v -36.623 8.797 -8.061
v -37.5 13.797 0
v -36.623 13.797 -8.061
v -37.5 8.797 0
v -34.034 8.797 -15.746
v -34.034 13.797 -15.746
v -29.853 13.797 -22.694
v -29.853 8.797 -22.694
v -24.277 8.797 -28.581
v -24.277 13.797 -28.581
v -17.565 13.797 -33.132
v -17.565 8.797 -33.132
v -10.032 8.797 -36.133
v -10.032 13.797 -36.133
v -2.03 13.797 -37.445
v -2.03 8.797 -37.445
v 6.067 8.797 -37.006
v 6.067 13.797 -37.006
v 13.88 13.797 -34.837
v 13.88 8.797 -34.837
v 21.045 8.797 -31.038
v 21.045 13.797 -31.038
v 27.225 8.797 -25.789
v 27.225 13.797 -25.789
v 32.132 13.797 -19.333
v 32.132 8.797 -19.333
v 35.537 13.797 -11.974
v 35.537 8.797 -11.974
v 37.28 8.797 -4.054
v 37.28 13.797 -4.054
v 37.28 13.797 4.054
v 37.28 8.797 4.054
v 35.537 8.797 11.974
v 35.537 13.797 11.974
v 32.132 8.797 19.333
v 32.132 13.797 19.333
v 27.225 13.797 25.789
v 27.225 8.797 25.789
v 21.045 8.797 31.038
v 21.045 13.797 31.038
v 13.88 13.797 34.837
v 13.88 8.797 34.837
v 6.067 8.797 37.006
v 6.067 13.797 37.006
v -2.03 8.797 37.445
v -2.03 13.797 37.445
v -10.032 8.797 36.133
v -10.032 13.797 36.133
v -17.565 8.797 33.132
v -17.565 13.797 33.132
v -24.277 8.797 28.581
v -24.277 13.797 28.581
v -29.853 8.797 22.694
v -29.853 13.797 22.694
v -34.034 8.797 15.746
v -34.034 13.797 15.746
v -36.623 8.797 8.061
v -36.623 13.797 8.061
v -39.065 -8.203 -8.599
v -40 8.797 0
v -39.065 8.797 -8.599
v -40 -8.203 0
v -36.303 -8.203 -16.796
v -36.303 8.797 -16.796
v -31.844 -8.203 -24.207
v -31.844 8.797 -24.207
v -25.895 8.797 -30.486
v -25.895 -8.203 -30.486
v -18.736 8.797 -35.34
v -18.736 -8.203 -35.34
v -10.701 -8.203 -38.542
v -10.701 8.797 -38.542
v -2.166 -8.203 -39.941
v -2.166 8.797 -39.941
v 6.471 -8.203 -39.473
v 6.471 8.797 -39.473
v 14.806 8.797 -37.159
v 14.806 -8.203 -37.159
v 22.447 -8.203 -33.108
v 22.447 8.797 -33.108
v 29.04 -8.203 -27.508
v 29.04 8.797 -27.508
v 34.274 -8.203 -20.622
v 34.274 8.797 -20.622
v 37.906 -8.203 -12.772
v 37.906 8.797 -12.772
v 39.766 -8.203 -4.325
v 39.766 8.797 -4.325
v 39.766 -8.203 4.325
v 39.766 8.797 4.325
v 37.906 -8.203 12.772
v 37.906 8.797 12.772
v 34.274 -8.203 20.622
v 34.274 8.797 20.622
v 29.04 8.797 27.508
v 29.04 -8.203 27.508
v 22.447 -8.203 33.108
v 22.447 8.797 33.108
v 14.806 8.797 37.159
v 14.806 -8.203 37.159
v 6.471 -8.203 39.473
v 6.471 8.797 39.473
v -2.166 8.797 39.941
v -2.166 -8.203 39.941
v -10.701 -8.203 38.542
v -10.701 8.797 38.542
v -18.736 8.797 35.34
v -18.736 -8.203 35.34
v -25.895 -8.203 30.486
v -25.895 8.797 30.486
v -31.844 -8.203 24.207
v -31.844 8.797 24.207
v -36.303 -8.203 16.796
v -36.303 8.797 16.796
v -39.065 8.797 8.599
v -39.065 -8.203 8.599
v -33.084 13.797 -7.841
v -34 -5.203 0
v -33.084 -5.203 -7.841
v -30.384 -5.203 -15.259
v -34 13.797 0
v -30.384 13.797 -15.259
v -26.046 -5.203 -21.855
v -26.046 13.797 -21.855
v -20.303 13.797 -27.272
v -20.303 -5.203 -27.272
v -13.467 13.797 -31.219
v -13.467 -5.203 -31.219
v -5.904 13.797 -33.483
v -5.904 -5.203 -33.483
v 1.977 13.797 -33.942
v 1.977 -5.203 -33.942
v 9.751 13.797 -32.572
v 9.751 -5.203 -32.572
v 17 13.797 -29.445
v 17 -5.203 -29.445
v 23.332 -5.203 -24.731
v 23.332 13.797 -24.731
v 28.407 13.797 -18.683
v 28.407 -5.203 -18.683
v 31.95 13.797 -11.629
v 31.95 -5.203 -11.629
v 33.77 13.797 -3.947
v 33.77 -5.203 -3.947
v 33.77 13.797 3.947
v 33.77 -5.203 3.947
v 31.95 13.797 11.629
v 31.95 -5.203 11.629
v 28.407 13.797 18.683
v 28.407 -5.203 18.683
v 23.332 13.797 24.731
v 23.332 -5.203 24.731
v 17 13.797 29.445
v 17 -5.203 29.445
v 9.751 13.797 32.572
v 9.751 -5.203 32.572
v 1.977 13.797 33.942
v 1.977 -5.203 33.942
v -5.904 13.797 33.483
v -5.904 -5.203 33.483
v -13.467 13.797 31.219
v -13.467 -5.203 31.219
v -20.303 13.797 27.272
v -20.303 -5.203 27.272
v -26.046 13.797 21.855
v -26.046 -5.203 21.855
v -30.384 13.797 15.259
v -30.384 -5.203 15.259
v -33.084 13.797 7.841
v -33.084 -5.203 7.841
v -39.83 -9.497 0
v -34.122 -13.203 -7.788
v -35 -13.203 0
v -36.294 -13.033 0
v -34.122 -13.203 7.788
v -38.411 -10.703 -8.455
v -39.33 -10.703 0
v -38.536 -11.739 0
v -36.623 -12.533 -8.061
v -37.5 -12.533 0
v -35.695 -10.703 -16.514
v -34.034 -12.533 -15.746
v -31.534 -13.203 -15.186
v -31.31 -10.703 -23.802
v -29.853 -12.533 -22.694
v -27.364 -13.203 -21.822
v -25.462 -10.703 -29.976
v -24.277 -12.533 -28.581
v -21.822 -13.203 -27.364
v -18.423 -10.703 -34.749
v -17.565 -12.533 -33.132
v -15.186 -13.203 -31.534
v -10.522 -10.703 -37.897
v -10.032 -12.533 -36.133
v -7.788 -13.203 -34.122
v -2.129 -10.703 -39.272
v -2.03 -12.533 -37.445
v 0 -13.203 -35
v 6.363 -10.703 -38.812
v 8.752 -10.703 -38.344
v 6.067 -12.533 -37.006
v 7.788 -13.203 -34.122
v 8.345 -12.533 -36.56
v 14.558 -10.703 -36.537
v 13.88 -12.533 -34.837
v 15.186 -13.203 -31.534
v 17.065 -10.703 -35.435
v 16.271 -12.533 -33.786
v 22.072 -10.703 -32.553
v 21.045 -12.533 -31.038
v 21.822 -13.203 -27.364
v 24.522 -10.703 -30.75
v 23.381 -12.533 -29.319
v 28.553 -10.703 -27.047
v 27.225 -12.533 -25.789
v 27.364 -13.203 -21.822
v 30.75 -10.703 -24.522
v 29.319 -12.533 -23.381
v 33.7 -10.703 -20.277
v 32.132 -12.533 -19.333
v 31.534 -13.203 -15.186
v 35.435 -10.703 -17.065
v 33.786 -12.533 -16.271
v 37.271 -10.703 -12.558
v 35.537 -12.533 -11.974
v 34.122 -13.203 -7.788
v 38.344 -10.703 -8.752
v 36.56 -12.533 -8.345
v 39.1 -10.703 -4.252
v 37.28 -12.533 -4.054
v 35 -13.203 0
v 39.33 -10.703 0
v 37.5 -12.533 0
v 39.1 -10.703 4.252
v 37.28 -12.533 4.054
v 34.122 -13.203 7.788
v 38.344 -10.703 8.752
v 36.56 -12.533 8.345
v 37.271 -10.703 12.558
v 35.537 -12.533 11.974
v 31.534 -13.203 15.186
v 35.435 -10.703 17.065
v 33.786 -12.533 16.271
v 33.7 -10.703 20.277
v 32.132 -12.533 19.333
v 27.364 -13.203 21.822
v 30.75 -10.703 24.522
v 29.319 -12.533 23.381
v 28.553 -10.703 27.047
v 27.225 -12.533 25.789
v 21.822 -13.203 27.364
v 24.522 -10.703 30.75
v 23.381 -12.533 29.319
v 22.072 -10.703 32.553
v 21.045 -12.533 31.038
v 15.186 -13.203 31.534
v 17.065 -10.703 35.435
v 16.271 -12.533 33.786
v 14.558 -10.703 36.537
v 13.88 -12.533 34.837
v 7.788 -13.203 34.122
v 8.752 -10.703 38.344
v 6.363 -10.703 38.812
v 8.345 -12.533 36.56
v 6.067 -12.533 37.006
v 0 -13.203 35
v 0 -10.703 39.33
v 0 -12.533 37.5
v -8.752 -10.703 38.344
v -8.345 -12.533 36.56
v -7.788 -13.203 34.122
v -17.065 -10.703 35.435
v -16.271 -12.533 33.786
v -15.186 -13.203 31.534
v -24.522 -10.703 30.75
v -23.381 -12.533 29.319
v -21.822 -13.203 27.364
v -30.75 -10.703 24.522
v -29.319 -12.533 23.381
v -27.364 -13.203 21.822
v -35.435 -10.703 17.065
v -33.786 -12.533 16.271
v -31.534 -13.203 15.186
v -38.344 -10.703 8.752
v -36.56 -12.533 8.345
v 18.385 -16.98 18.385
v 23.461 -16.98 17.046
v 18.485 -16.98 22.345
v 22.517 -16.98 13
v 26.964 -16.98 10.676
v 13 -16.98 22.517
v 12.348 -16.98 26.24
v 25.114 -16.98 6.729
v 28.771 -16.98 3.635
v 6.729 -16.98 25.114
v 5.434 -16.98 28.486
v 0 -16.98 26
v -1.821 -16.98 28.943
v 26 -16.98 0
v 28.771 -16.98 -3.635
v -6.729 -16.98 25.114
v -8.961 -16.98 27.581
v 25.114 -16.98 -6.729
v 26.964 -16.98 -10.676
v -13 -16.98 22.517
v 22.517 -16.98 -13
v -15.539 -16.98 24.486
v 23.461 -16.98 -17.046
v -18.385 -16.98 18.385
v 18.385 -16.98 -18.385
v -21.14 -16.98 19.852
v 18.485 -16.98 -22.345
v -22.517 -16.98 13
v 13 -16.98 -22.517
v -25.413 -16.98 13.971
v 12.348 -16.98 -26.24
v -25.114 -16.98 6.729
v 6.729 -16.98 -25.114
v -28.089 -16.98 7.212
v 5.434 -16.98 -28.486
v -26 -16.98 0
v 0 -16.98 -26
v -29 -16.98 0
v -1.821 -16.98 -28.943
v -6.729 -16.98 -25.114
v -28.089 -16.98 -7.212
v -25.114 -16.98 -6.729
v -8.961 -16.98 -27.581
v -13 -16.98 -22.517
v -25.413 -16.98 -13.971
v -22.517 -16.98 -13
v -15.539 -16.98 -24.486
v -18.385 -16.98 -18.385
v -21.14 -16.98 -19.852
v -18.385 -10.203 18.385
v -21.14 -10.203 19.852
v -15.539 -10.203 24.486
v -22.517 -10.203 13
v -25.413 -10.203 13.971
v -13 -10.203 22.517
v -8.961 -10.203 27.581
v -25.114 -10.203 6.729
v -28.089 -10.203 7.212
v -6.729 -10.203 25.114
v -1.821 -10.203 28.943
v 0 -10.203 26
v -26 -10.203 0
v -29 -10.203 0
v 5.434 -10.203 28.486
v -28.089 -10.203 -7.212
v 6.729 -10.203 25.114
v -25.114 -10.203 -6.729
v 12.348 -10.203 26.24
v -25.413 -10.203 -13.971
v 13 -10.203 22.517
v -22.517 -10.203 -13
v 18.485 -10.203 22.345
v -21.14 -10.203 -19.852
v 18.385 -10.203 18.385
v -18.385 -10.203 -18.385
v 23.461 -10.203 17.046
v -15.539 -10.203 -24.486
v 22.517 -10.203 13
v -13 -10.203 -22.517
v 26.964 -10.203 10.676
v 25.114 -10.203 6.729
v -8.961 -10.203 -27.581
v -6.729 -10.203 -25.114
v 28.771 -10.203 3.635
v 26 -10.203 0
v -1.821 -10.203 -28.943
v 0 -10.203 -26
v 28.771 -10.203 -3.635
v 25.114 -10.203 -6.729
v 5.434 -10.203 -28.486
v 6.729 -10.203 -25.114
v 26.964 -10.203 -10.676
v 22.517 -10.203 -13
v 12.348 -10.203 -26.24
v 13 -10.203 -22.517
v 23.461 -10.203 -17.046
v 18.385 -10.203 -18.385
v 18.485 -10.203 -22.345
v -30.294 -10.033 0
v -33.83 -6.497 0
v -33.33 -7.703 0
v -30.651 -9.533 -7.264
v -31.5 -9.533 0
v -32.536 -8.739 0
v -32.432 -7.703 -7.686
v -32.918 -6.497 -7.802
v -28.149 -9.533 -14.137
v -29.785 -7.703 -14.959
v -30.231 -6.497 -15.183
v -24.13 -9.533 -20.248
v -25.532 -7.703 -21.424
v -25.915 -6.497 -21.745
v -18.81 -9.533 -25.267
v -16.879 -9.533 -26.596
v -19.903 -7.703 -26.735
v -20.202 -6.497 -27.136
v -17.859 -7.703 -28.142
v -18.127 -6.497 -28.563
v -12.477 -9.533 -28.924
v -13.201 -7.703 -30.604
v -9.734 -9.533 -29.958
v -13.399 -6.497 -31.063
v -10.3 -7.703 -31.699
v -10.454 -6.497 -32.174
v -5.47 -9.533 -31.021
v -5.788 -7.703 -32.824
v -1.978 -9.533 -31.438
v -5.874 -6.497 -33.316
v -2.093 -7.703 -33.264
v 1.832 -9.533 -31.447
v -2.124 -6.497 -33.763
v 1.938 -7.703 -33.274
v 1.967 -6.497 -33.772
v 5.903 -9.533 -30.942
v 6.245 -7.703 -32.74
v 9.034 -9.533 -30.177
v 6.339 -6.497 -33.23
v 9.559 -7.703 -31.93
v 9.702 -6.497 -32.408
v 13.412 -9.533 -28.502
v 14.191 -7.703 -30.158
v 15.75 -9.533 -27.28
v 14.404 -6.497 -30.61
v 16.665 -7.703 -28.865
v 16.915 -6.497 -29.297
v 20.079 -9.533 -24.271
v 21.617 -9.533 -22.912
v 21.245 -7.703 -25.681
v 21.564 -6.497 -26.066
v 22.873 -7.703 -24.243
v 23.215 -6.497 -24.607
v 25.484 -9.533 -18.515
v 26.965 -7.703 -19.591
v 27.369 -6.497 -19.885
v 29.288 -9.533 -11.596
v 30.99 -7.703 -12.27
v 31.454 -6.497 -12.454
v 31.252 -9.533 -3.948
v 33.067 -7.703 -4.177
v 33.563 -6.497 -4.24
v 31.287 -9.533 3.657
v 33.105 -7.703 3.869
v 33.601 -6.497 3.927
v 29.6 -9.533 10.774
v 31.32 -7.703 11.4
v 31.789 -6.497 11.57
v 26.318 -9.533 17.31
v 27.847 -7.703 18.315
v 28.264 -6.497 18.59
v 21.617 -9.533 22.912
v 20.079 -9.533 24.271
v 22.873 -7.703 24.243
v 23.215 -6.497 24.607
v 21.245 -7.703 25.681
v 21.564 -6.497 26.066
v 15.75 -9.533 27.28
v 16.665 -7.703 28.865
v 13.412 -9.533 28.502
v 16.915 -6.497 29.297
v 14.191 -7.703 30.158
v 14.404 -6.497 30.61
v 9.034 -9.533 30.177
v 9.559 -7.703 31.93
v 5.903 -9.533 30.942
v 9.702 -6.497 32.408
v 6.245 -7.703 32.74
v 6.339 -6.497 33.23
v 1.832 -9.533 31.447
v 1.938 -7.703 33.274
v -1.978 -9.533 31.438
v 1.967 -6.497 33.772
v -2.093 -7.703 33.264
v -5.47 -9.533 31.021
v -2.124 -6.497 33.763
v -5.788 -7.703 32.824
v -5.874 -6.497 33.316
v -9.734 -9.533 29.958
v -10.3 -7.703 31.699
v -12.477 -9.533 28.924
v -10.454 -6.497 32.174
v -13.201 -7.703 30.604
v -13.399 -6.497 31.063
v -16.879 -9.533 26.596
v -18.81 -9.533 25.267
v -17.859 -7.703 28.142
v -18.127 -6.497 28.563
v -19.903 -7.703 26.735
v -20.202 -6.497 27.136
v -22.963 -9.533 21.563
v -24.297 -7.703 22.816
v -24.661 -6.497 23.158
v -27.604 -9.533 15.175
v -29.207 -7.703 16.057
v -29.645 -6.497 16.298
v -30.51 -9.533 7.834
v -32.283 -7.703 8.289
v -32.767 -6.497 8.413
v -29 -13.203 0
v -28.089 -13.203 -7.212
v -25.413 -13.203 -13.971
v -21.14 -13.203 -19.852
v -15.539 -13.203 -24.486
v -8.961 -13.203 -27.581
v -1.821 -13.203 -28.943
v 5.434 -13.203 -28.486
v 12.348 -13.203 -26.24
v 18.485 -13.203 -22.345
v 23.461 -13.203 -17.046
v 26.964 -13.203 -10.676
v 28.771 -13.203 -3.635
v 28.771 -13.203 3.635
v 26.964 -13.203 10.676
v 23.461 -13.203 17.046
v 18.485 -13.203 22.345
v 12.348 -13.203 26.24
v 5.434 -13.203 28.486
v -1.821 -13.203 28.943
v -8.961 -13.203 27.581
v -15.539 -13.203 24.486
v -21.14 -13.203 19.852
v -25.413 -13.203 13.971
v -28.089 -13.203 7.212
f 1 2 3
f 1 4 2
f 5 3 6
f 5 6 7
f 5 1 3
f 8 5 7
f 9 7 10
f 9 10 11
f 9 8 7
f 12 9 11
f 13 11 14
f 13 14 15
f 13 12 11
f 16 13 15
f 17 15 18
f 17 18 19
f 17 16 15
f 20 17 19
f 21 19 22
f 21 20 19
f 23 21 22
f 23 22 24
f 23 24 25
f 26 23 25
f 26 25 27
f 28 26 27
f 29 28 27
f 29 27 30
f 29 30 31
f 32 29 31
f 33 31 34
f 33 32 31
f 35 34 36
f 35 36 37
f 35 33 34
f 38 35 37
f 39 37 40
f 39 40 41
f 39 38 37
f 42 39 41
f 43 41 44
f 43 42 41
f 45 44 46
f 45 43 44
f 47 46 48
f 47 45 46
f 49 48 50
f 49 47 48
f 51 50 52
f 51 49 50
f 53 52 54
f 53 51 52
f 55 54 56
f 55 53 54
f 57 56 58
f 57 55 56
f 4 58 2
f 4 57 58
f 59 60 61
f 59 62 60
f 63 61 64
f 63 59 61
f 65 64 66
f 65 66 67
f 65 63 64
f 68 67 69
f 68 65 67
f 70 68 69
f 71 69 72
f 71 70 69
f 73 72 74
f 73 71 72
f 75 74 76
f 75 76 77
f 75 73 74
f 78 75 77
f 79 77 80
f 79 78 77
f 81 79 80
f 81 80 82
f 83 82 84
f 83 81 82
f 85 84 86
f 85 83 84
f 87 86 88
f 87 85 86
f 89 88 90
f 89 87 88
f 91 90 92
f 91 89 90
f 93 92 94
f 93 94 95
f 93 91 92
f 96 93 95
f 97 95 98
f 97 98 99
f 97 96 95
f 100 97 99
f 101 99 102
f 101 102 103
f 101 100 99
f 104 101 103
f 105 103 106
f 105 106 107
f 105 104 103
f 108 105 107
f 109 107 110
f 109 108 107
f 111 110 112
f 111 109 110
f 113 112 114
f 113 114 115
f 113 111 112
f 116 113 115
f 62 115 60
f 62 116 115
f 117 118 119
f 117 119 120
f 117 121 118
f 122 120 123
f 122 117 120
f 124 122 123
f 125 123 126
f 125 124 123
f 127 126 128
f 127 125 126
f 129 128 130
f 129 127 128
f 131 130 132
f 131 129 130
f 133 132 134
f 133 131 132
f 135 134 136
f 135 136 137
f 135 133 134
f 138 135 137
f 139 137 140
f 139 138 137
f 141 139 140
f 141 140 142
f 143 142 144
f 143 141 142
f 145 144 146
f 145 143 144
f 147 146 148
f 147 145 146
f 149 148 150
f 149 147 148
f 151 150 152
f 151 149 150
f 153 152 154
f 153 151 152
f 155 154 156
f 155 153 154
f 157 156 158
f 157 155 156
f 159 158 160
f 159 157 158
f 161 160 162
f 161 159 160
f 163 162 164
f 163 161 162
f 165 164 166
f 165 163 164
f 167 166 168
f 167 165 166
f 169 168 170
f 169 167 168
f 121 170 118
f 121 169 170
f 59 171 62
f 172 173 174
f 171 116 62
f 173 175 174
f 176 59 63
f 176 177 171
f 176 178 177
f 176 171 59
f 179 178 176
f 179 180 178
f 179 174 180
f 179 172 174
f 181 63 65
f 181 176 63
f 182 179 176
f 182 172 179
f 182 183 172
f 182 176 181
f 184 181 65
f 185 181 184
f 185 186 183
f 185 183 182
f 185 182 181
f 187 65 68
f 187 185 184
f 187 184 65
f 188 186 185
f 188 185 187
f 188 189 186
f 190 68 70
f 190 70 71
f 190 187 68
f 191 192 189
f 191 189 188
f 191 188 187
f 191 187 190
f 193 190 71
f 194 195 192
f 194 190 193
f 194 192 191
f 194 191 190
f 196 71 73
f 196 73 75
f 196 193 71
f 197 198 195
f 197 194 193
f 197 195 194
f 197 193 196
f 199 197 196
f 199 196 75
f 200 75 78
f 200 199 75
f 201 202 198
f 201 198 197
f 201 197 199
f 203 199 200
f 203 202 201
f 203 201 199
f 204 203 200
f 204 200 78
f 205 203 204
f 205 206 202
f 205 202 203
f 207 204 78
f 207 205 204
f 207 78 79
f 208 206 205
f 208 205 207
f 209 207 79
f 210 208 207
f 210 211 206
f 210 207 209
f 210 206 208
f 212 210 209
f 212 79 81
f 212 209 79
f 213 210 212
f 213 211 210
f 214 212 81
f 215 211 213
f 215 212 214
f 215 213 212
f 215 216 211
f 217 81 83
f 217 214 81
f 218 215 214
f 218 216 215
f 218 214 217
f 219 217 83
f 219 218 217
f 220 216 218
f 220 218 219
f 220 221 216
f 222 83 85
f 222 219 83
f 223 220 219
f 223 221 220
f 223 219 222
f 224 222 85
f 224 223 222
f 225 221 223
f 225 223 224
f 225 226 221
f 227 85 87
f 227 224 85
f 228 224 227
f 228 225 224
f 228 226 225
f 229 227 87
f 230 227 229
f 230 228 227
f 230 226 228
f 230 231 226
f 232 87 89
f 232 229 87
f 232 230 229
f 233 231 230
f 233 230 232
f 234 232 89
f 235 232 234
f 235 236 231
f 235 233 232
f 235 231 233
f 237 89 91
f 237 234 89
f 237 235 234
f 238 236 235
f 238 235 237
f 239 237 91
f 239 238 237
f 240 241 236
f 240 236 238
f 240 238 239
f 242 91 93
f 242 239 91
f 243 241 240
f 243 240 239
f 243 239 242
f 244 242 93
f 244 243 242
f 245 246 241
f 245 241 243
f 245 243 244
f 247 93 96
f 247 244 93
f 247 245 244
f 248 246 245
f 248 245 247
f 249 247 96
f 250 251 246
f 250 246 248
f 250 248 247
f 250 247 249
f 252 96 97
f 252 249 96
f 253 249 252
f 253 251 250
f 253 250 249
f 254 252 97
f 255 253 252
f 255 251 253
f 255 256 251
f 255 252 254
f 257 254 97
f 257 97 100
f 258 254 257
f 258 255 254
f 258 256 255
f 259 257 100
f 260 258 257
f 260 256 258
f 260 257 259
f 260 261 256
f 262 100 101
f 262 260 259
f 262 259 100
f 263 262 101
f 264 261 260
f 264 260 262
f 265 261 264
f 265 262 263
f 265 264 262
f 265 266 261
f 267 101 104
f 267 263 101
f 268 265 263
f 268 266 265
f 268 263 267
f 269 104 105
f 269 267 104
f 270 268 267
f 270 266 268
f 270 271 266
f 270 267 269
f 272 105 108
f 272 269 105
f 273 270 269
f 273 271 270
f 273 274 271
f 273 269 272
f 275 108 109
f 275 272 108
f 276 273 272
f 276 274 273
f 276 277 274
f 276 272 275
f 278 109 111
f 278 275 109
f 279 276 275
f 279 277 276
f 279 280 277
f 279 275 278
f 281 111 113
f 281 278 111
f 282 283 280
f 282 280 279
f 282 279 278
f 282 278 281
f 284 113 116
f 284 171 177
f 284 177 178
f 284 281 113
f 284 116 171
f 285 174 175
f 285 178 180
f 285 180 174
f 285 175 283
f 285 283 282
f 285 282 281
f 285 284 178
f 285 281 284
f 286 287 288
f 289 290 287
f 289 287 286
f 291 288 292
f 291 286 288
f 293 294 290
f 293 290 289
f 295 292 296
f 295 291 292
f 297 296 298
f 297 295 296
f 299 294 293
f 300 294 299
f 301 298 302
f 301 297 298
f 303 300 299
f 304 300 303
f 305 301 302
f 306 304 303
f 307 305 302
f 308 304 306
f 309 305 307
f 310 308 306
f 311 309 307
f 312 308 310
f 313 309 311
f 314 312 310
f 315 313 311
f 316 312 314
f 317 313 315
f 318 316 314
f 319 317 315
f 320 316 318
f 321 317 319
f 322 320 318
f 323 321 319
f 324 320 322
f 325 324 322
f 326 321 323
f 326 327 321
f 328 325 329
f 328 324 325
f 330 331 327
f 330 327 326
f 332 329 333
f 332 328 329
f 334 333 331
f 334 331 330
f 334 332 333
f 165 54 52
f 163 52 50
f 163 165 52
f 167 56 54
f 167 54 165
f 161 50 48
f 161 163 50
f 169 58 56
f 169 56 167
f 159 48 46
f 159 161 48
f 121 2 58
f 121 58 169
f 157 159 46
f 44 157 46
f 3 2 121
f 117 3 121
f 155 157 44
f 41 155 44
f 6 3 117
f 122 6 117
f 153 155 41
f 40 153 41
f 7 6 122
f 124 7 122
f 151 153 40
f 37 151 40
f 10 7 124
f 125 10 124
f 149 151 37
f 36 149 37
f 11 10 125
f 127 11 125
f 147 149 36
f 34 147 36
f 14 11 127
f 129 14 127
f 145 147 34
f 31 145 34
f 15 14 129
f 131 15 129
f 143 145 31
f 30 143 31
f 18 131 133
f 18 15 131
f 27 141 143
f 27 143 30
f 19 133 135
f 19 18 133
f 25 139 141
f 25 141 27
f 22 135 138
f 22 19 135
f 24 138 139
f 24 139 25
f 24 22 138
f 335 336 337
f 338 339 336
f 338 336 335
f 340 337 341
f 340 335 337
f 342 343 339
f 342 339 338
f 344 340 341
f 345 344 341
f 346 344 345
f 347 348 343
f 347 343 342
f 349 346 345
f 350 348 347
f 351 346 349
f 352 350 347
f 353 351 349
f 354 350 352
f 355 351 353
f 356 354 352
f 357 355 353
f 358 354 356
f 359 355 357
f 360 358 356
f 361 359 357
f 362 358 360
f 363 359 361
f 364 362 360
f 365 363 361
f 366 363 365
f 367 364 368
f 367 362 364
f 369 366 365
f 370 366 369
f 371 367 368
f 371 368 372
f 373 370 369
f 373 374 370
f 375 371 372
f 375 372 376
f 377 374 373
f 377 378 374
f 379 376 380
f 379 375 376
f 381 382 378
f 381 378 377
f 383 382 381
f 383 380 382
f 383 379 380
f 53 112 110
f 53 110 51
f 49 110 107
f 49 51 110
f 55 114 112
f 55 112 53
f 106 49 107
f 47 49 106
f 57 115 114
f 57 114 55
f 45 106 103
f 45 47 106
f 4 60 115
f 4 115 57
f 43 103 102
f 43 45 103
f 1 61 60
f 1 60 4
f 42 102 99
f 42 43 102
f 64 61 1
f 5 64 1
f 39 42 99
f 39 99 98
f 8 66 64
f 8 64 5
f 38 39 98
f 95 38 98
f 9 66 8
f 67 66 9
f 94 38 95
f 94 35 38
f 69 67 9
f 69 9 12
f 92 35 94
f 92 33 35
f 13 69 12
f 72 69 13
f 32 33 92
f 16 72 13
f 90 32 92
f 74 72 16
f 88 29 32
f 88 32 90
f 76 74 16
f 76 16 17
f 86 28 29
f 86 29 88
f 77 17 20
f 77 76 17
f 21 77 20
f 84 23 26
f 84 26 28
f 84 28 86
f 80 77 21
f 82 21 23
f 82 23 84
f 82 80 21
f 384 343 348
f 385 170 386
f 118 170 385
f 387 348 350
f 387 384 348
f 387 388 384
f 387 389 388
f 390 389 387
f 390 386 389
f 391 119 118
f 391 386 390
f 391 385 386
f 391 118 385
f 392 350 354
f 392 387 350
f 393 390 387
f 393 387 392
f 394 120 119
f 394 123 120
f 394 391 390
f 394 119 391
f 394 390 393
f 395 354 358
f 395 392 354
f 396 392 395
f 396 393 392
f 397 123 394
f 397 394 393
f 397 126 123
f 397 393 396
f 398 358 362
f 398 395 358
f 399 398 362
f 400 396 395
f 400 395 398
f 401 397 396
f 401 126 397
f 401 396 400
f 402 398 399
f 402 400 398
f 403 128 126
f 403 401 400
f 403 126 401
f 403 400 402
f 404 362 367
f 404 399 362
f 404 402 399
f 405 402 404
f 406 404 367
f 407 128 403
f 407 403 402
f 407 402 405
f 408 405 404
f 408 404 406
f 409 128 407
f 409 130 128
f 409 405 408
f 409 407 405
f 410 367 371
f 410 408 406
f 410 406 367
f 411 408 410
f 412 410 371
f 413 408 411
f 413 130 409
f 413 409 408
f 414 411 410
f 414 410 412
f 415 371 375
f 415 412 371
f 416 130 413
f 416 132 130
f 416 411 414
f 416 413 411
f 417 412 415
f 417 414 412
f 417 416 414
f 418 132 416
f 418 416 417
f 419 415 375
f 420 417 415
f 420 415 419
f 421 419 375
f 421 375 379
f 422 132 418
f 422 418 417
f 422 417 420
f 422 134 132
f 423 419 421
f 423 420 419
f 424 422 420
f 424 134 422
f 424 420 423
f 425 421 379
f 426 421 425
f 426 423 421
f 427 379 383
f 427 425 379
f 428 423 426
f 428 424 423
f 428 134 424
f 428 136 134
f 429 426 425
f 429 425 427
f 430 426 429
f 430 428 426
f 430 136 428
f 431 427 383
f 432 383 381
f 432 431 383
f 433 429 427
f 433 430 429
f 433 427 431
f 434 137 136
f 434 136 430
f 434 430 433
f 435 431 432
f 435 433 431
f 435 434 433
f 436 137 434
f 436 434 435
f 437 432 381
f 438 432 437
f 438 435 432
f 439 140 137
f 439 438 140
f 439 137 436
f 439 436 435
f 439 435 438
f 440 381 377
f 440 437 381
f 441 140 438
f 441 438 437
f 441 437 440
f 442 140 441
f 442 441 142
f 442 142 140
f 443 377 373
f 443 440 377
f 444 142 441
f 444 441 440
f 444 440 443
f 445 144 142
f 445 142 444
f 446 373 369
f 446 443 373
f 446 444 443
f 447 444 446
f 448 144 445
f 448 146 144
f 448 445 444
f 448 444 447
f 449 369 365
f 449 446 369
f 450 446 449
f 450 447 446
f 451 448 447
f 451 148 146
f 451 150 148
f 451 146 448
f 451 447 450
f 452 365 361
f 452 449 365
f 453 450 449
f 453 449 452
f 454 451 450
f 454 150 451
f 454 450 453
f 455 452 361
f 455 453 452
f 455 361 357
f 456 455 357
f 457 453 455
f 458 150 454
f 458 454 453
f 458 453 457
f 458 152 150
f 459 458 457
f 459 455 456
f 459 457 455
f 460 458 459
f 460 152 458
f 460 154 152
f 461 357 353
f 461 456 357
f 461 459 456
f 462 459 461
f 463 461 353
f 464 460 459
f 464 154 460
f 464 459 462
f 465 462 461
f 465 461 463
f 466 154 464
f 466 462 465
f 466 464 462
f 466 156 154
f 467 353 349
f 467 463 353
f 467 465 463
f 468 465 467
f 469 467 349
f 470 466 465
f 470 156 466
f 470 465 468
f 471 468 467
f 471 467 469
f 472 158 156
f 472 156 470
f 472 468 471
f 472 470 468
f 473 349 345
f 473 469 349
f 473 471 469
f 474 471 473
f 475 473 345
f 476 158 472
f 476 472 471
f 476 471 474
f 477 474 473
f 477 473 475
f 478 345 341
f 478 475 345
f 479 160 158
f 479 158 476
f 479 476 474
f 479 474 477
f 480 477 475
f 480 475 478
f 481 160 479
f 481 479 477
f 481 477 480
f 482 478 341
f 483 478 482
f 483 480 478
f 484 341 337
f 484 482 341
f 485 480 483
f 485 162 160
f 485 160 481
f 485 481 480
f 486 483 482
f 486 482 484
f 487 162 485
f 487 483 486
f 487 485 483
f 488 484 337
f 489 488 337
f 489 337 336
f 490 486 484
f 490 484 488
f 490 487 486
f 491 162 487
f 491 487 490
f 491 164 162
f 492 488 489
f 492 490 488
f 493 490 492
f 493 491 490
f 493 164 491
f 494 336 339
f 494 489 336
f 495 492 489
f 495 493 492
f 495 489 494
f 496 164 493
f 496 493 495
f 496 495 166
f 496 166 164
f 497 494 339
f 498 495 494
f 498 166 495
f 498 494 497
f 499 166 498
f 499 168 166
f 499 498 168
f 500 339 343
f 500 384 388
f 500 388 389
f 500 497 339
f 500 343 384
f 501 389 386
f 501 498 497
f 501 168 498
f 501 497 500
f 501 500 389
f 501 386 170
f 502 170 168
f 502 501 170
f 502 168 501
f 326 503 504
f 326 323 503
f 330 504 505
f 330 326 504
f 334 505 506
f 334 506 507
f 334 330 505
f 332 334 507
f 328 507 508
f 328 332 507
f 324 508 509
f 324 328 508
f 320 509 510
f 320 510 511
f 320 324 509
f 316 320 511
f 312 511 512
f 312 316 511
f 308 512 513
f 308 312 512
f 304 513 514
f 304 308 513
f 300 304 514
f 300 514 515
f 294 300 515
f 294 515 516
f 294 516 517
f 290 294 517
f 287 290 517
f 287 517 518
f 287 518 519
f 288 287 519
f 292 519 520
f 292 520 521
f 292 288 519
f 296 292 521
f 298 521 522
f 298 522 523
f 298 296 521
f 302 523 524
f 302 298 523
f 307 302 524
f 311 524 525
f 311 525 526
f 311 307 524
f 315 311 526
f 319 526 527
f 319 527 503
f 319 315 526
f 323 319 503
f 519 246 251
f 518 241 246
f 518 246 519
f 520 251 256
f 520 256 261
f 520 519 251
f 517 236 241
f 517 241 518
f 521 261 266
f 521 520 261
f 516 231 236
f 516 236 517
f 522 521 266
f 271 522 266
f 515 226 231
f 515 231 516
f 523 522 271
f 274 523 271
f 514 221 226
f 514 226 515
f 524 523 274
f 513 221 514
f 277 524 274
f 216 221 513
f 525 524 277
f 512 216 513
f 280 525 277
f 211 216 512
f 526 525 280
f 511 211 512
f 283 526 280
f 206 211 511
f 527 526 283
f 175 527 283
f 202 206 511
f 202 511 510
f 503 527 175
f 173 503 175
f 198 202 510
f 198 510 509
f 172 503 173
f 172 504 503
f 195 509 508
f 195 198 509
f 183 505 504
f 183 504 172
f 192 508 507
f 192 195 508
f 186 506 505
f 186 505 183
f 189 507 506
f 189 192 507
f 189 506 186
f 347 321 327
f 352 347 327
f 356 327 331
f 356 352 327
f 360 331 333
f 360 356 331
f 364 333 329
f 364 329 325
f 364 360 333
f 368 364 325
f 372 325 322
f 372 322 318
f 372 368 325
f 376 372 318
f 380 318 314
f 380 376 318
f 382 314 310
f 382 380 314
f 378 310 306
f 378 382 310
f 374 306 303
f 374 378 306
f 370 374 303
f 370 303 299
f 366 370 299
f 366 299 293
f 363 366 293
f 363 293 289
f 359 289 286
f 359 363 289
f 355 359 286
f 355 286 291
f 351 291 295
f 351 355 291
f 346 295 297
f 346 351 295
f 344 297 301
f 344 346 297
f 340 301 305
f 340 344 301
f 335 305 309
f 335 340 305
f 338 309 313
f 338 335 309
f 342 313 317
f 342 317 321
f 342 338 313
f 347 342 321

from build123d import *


with BuildPart() as part:
    # Sketch1 → Revolve1 (revolve)
    with BuildSketch(Plane.XY):
        with BuildLine():
            Line((-40, 8.79698141), (-40, -8.20301859))
            ThreePointArc((-40, -8.20301859), (-38.535533906, -11.738552496), (-35, -13.20301859))
            Line((-35, -13.20301859), (-29, -13.20301859))
            Line((-29, -13.20301859), (-29, -16.980259628))
            Line((-29, -16.980259628), (-26, -16.980259628))
            Line((-26, -16.980259628), (-26, -10.20301859))
            Line((-26, -10.20301859), (-29, -10.20301859))
            ThreePointArc((-29, -10.20301859), (-32.535533906, -8.738552496), (-34, -5.20301859))
            Line((-34, -5.20301859), (-34, 13.79698141))
            Line((-34, 13.79698141), (-37.5, 13.79698141))
            Line((-37.5, 13.79698141), (-37.5, 8.79698141))
            Line((-37.5, 8.79698141), (-40, 8.79698141))
        make_face()
    revolve(axis=Axis((0, 133.043372469, 0), (0, -1, 0)))


solid = part.part
